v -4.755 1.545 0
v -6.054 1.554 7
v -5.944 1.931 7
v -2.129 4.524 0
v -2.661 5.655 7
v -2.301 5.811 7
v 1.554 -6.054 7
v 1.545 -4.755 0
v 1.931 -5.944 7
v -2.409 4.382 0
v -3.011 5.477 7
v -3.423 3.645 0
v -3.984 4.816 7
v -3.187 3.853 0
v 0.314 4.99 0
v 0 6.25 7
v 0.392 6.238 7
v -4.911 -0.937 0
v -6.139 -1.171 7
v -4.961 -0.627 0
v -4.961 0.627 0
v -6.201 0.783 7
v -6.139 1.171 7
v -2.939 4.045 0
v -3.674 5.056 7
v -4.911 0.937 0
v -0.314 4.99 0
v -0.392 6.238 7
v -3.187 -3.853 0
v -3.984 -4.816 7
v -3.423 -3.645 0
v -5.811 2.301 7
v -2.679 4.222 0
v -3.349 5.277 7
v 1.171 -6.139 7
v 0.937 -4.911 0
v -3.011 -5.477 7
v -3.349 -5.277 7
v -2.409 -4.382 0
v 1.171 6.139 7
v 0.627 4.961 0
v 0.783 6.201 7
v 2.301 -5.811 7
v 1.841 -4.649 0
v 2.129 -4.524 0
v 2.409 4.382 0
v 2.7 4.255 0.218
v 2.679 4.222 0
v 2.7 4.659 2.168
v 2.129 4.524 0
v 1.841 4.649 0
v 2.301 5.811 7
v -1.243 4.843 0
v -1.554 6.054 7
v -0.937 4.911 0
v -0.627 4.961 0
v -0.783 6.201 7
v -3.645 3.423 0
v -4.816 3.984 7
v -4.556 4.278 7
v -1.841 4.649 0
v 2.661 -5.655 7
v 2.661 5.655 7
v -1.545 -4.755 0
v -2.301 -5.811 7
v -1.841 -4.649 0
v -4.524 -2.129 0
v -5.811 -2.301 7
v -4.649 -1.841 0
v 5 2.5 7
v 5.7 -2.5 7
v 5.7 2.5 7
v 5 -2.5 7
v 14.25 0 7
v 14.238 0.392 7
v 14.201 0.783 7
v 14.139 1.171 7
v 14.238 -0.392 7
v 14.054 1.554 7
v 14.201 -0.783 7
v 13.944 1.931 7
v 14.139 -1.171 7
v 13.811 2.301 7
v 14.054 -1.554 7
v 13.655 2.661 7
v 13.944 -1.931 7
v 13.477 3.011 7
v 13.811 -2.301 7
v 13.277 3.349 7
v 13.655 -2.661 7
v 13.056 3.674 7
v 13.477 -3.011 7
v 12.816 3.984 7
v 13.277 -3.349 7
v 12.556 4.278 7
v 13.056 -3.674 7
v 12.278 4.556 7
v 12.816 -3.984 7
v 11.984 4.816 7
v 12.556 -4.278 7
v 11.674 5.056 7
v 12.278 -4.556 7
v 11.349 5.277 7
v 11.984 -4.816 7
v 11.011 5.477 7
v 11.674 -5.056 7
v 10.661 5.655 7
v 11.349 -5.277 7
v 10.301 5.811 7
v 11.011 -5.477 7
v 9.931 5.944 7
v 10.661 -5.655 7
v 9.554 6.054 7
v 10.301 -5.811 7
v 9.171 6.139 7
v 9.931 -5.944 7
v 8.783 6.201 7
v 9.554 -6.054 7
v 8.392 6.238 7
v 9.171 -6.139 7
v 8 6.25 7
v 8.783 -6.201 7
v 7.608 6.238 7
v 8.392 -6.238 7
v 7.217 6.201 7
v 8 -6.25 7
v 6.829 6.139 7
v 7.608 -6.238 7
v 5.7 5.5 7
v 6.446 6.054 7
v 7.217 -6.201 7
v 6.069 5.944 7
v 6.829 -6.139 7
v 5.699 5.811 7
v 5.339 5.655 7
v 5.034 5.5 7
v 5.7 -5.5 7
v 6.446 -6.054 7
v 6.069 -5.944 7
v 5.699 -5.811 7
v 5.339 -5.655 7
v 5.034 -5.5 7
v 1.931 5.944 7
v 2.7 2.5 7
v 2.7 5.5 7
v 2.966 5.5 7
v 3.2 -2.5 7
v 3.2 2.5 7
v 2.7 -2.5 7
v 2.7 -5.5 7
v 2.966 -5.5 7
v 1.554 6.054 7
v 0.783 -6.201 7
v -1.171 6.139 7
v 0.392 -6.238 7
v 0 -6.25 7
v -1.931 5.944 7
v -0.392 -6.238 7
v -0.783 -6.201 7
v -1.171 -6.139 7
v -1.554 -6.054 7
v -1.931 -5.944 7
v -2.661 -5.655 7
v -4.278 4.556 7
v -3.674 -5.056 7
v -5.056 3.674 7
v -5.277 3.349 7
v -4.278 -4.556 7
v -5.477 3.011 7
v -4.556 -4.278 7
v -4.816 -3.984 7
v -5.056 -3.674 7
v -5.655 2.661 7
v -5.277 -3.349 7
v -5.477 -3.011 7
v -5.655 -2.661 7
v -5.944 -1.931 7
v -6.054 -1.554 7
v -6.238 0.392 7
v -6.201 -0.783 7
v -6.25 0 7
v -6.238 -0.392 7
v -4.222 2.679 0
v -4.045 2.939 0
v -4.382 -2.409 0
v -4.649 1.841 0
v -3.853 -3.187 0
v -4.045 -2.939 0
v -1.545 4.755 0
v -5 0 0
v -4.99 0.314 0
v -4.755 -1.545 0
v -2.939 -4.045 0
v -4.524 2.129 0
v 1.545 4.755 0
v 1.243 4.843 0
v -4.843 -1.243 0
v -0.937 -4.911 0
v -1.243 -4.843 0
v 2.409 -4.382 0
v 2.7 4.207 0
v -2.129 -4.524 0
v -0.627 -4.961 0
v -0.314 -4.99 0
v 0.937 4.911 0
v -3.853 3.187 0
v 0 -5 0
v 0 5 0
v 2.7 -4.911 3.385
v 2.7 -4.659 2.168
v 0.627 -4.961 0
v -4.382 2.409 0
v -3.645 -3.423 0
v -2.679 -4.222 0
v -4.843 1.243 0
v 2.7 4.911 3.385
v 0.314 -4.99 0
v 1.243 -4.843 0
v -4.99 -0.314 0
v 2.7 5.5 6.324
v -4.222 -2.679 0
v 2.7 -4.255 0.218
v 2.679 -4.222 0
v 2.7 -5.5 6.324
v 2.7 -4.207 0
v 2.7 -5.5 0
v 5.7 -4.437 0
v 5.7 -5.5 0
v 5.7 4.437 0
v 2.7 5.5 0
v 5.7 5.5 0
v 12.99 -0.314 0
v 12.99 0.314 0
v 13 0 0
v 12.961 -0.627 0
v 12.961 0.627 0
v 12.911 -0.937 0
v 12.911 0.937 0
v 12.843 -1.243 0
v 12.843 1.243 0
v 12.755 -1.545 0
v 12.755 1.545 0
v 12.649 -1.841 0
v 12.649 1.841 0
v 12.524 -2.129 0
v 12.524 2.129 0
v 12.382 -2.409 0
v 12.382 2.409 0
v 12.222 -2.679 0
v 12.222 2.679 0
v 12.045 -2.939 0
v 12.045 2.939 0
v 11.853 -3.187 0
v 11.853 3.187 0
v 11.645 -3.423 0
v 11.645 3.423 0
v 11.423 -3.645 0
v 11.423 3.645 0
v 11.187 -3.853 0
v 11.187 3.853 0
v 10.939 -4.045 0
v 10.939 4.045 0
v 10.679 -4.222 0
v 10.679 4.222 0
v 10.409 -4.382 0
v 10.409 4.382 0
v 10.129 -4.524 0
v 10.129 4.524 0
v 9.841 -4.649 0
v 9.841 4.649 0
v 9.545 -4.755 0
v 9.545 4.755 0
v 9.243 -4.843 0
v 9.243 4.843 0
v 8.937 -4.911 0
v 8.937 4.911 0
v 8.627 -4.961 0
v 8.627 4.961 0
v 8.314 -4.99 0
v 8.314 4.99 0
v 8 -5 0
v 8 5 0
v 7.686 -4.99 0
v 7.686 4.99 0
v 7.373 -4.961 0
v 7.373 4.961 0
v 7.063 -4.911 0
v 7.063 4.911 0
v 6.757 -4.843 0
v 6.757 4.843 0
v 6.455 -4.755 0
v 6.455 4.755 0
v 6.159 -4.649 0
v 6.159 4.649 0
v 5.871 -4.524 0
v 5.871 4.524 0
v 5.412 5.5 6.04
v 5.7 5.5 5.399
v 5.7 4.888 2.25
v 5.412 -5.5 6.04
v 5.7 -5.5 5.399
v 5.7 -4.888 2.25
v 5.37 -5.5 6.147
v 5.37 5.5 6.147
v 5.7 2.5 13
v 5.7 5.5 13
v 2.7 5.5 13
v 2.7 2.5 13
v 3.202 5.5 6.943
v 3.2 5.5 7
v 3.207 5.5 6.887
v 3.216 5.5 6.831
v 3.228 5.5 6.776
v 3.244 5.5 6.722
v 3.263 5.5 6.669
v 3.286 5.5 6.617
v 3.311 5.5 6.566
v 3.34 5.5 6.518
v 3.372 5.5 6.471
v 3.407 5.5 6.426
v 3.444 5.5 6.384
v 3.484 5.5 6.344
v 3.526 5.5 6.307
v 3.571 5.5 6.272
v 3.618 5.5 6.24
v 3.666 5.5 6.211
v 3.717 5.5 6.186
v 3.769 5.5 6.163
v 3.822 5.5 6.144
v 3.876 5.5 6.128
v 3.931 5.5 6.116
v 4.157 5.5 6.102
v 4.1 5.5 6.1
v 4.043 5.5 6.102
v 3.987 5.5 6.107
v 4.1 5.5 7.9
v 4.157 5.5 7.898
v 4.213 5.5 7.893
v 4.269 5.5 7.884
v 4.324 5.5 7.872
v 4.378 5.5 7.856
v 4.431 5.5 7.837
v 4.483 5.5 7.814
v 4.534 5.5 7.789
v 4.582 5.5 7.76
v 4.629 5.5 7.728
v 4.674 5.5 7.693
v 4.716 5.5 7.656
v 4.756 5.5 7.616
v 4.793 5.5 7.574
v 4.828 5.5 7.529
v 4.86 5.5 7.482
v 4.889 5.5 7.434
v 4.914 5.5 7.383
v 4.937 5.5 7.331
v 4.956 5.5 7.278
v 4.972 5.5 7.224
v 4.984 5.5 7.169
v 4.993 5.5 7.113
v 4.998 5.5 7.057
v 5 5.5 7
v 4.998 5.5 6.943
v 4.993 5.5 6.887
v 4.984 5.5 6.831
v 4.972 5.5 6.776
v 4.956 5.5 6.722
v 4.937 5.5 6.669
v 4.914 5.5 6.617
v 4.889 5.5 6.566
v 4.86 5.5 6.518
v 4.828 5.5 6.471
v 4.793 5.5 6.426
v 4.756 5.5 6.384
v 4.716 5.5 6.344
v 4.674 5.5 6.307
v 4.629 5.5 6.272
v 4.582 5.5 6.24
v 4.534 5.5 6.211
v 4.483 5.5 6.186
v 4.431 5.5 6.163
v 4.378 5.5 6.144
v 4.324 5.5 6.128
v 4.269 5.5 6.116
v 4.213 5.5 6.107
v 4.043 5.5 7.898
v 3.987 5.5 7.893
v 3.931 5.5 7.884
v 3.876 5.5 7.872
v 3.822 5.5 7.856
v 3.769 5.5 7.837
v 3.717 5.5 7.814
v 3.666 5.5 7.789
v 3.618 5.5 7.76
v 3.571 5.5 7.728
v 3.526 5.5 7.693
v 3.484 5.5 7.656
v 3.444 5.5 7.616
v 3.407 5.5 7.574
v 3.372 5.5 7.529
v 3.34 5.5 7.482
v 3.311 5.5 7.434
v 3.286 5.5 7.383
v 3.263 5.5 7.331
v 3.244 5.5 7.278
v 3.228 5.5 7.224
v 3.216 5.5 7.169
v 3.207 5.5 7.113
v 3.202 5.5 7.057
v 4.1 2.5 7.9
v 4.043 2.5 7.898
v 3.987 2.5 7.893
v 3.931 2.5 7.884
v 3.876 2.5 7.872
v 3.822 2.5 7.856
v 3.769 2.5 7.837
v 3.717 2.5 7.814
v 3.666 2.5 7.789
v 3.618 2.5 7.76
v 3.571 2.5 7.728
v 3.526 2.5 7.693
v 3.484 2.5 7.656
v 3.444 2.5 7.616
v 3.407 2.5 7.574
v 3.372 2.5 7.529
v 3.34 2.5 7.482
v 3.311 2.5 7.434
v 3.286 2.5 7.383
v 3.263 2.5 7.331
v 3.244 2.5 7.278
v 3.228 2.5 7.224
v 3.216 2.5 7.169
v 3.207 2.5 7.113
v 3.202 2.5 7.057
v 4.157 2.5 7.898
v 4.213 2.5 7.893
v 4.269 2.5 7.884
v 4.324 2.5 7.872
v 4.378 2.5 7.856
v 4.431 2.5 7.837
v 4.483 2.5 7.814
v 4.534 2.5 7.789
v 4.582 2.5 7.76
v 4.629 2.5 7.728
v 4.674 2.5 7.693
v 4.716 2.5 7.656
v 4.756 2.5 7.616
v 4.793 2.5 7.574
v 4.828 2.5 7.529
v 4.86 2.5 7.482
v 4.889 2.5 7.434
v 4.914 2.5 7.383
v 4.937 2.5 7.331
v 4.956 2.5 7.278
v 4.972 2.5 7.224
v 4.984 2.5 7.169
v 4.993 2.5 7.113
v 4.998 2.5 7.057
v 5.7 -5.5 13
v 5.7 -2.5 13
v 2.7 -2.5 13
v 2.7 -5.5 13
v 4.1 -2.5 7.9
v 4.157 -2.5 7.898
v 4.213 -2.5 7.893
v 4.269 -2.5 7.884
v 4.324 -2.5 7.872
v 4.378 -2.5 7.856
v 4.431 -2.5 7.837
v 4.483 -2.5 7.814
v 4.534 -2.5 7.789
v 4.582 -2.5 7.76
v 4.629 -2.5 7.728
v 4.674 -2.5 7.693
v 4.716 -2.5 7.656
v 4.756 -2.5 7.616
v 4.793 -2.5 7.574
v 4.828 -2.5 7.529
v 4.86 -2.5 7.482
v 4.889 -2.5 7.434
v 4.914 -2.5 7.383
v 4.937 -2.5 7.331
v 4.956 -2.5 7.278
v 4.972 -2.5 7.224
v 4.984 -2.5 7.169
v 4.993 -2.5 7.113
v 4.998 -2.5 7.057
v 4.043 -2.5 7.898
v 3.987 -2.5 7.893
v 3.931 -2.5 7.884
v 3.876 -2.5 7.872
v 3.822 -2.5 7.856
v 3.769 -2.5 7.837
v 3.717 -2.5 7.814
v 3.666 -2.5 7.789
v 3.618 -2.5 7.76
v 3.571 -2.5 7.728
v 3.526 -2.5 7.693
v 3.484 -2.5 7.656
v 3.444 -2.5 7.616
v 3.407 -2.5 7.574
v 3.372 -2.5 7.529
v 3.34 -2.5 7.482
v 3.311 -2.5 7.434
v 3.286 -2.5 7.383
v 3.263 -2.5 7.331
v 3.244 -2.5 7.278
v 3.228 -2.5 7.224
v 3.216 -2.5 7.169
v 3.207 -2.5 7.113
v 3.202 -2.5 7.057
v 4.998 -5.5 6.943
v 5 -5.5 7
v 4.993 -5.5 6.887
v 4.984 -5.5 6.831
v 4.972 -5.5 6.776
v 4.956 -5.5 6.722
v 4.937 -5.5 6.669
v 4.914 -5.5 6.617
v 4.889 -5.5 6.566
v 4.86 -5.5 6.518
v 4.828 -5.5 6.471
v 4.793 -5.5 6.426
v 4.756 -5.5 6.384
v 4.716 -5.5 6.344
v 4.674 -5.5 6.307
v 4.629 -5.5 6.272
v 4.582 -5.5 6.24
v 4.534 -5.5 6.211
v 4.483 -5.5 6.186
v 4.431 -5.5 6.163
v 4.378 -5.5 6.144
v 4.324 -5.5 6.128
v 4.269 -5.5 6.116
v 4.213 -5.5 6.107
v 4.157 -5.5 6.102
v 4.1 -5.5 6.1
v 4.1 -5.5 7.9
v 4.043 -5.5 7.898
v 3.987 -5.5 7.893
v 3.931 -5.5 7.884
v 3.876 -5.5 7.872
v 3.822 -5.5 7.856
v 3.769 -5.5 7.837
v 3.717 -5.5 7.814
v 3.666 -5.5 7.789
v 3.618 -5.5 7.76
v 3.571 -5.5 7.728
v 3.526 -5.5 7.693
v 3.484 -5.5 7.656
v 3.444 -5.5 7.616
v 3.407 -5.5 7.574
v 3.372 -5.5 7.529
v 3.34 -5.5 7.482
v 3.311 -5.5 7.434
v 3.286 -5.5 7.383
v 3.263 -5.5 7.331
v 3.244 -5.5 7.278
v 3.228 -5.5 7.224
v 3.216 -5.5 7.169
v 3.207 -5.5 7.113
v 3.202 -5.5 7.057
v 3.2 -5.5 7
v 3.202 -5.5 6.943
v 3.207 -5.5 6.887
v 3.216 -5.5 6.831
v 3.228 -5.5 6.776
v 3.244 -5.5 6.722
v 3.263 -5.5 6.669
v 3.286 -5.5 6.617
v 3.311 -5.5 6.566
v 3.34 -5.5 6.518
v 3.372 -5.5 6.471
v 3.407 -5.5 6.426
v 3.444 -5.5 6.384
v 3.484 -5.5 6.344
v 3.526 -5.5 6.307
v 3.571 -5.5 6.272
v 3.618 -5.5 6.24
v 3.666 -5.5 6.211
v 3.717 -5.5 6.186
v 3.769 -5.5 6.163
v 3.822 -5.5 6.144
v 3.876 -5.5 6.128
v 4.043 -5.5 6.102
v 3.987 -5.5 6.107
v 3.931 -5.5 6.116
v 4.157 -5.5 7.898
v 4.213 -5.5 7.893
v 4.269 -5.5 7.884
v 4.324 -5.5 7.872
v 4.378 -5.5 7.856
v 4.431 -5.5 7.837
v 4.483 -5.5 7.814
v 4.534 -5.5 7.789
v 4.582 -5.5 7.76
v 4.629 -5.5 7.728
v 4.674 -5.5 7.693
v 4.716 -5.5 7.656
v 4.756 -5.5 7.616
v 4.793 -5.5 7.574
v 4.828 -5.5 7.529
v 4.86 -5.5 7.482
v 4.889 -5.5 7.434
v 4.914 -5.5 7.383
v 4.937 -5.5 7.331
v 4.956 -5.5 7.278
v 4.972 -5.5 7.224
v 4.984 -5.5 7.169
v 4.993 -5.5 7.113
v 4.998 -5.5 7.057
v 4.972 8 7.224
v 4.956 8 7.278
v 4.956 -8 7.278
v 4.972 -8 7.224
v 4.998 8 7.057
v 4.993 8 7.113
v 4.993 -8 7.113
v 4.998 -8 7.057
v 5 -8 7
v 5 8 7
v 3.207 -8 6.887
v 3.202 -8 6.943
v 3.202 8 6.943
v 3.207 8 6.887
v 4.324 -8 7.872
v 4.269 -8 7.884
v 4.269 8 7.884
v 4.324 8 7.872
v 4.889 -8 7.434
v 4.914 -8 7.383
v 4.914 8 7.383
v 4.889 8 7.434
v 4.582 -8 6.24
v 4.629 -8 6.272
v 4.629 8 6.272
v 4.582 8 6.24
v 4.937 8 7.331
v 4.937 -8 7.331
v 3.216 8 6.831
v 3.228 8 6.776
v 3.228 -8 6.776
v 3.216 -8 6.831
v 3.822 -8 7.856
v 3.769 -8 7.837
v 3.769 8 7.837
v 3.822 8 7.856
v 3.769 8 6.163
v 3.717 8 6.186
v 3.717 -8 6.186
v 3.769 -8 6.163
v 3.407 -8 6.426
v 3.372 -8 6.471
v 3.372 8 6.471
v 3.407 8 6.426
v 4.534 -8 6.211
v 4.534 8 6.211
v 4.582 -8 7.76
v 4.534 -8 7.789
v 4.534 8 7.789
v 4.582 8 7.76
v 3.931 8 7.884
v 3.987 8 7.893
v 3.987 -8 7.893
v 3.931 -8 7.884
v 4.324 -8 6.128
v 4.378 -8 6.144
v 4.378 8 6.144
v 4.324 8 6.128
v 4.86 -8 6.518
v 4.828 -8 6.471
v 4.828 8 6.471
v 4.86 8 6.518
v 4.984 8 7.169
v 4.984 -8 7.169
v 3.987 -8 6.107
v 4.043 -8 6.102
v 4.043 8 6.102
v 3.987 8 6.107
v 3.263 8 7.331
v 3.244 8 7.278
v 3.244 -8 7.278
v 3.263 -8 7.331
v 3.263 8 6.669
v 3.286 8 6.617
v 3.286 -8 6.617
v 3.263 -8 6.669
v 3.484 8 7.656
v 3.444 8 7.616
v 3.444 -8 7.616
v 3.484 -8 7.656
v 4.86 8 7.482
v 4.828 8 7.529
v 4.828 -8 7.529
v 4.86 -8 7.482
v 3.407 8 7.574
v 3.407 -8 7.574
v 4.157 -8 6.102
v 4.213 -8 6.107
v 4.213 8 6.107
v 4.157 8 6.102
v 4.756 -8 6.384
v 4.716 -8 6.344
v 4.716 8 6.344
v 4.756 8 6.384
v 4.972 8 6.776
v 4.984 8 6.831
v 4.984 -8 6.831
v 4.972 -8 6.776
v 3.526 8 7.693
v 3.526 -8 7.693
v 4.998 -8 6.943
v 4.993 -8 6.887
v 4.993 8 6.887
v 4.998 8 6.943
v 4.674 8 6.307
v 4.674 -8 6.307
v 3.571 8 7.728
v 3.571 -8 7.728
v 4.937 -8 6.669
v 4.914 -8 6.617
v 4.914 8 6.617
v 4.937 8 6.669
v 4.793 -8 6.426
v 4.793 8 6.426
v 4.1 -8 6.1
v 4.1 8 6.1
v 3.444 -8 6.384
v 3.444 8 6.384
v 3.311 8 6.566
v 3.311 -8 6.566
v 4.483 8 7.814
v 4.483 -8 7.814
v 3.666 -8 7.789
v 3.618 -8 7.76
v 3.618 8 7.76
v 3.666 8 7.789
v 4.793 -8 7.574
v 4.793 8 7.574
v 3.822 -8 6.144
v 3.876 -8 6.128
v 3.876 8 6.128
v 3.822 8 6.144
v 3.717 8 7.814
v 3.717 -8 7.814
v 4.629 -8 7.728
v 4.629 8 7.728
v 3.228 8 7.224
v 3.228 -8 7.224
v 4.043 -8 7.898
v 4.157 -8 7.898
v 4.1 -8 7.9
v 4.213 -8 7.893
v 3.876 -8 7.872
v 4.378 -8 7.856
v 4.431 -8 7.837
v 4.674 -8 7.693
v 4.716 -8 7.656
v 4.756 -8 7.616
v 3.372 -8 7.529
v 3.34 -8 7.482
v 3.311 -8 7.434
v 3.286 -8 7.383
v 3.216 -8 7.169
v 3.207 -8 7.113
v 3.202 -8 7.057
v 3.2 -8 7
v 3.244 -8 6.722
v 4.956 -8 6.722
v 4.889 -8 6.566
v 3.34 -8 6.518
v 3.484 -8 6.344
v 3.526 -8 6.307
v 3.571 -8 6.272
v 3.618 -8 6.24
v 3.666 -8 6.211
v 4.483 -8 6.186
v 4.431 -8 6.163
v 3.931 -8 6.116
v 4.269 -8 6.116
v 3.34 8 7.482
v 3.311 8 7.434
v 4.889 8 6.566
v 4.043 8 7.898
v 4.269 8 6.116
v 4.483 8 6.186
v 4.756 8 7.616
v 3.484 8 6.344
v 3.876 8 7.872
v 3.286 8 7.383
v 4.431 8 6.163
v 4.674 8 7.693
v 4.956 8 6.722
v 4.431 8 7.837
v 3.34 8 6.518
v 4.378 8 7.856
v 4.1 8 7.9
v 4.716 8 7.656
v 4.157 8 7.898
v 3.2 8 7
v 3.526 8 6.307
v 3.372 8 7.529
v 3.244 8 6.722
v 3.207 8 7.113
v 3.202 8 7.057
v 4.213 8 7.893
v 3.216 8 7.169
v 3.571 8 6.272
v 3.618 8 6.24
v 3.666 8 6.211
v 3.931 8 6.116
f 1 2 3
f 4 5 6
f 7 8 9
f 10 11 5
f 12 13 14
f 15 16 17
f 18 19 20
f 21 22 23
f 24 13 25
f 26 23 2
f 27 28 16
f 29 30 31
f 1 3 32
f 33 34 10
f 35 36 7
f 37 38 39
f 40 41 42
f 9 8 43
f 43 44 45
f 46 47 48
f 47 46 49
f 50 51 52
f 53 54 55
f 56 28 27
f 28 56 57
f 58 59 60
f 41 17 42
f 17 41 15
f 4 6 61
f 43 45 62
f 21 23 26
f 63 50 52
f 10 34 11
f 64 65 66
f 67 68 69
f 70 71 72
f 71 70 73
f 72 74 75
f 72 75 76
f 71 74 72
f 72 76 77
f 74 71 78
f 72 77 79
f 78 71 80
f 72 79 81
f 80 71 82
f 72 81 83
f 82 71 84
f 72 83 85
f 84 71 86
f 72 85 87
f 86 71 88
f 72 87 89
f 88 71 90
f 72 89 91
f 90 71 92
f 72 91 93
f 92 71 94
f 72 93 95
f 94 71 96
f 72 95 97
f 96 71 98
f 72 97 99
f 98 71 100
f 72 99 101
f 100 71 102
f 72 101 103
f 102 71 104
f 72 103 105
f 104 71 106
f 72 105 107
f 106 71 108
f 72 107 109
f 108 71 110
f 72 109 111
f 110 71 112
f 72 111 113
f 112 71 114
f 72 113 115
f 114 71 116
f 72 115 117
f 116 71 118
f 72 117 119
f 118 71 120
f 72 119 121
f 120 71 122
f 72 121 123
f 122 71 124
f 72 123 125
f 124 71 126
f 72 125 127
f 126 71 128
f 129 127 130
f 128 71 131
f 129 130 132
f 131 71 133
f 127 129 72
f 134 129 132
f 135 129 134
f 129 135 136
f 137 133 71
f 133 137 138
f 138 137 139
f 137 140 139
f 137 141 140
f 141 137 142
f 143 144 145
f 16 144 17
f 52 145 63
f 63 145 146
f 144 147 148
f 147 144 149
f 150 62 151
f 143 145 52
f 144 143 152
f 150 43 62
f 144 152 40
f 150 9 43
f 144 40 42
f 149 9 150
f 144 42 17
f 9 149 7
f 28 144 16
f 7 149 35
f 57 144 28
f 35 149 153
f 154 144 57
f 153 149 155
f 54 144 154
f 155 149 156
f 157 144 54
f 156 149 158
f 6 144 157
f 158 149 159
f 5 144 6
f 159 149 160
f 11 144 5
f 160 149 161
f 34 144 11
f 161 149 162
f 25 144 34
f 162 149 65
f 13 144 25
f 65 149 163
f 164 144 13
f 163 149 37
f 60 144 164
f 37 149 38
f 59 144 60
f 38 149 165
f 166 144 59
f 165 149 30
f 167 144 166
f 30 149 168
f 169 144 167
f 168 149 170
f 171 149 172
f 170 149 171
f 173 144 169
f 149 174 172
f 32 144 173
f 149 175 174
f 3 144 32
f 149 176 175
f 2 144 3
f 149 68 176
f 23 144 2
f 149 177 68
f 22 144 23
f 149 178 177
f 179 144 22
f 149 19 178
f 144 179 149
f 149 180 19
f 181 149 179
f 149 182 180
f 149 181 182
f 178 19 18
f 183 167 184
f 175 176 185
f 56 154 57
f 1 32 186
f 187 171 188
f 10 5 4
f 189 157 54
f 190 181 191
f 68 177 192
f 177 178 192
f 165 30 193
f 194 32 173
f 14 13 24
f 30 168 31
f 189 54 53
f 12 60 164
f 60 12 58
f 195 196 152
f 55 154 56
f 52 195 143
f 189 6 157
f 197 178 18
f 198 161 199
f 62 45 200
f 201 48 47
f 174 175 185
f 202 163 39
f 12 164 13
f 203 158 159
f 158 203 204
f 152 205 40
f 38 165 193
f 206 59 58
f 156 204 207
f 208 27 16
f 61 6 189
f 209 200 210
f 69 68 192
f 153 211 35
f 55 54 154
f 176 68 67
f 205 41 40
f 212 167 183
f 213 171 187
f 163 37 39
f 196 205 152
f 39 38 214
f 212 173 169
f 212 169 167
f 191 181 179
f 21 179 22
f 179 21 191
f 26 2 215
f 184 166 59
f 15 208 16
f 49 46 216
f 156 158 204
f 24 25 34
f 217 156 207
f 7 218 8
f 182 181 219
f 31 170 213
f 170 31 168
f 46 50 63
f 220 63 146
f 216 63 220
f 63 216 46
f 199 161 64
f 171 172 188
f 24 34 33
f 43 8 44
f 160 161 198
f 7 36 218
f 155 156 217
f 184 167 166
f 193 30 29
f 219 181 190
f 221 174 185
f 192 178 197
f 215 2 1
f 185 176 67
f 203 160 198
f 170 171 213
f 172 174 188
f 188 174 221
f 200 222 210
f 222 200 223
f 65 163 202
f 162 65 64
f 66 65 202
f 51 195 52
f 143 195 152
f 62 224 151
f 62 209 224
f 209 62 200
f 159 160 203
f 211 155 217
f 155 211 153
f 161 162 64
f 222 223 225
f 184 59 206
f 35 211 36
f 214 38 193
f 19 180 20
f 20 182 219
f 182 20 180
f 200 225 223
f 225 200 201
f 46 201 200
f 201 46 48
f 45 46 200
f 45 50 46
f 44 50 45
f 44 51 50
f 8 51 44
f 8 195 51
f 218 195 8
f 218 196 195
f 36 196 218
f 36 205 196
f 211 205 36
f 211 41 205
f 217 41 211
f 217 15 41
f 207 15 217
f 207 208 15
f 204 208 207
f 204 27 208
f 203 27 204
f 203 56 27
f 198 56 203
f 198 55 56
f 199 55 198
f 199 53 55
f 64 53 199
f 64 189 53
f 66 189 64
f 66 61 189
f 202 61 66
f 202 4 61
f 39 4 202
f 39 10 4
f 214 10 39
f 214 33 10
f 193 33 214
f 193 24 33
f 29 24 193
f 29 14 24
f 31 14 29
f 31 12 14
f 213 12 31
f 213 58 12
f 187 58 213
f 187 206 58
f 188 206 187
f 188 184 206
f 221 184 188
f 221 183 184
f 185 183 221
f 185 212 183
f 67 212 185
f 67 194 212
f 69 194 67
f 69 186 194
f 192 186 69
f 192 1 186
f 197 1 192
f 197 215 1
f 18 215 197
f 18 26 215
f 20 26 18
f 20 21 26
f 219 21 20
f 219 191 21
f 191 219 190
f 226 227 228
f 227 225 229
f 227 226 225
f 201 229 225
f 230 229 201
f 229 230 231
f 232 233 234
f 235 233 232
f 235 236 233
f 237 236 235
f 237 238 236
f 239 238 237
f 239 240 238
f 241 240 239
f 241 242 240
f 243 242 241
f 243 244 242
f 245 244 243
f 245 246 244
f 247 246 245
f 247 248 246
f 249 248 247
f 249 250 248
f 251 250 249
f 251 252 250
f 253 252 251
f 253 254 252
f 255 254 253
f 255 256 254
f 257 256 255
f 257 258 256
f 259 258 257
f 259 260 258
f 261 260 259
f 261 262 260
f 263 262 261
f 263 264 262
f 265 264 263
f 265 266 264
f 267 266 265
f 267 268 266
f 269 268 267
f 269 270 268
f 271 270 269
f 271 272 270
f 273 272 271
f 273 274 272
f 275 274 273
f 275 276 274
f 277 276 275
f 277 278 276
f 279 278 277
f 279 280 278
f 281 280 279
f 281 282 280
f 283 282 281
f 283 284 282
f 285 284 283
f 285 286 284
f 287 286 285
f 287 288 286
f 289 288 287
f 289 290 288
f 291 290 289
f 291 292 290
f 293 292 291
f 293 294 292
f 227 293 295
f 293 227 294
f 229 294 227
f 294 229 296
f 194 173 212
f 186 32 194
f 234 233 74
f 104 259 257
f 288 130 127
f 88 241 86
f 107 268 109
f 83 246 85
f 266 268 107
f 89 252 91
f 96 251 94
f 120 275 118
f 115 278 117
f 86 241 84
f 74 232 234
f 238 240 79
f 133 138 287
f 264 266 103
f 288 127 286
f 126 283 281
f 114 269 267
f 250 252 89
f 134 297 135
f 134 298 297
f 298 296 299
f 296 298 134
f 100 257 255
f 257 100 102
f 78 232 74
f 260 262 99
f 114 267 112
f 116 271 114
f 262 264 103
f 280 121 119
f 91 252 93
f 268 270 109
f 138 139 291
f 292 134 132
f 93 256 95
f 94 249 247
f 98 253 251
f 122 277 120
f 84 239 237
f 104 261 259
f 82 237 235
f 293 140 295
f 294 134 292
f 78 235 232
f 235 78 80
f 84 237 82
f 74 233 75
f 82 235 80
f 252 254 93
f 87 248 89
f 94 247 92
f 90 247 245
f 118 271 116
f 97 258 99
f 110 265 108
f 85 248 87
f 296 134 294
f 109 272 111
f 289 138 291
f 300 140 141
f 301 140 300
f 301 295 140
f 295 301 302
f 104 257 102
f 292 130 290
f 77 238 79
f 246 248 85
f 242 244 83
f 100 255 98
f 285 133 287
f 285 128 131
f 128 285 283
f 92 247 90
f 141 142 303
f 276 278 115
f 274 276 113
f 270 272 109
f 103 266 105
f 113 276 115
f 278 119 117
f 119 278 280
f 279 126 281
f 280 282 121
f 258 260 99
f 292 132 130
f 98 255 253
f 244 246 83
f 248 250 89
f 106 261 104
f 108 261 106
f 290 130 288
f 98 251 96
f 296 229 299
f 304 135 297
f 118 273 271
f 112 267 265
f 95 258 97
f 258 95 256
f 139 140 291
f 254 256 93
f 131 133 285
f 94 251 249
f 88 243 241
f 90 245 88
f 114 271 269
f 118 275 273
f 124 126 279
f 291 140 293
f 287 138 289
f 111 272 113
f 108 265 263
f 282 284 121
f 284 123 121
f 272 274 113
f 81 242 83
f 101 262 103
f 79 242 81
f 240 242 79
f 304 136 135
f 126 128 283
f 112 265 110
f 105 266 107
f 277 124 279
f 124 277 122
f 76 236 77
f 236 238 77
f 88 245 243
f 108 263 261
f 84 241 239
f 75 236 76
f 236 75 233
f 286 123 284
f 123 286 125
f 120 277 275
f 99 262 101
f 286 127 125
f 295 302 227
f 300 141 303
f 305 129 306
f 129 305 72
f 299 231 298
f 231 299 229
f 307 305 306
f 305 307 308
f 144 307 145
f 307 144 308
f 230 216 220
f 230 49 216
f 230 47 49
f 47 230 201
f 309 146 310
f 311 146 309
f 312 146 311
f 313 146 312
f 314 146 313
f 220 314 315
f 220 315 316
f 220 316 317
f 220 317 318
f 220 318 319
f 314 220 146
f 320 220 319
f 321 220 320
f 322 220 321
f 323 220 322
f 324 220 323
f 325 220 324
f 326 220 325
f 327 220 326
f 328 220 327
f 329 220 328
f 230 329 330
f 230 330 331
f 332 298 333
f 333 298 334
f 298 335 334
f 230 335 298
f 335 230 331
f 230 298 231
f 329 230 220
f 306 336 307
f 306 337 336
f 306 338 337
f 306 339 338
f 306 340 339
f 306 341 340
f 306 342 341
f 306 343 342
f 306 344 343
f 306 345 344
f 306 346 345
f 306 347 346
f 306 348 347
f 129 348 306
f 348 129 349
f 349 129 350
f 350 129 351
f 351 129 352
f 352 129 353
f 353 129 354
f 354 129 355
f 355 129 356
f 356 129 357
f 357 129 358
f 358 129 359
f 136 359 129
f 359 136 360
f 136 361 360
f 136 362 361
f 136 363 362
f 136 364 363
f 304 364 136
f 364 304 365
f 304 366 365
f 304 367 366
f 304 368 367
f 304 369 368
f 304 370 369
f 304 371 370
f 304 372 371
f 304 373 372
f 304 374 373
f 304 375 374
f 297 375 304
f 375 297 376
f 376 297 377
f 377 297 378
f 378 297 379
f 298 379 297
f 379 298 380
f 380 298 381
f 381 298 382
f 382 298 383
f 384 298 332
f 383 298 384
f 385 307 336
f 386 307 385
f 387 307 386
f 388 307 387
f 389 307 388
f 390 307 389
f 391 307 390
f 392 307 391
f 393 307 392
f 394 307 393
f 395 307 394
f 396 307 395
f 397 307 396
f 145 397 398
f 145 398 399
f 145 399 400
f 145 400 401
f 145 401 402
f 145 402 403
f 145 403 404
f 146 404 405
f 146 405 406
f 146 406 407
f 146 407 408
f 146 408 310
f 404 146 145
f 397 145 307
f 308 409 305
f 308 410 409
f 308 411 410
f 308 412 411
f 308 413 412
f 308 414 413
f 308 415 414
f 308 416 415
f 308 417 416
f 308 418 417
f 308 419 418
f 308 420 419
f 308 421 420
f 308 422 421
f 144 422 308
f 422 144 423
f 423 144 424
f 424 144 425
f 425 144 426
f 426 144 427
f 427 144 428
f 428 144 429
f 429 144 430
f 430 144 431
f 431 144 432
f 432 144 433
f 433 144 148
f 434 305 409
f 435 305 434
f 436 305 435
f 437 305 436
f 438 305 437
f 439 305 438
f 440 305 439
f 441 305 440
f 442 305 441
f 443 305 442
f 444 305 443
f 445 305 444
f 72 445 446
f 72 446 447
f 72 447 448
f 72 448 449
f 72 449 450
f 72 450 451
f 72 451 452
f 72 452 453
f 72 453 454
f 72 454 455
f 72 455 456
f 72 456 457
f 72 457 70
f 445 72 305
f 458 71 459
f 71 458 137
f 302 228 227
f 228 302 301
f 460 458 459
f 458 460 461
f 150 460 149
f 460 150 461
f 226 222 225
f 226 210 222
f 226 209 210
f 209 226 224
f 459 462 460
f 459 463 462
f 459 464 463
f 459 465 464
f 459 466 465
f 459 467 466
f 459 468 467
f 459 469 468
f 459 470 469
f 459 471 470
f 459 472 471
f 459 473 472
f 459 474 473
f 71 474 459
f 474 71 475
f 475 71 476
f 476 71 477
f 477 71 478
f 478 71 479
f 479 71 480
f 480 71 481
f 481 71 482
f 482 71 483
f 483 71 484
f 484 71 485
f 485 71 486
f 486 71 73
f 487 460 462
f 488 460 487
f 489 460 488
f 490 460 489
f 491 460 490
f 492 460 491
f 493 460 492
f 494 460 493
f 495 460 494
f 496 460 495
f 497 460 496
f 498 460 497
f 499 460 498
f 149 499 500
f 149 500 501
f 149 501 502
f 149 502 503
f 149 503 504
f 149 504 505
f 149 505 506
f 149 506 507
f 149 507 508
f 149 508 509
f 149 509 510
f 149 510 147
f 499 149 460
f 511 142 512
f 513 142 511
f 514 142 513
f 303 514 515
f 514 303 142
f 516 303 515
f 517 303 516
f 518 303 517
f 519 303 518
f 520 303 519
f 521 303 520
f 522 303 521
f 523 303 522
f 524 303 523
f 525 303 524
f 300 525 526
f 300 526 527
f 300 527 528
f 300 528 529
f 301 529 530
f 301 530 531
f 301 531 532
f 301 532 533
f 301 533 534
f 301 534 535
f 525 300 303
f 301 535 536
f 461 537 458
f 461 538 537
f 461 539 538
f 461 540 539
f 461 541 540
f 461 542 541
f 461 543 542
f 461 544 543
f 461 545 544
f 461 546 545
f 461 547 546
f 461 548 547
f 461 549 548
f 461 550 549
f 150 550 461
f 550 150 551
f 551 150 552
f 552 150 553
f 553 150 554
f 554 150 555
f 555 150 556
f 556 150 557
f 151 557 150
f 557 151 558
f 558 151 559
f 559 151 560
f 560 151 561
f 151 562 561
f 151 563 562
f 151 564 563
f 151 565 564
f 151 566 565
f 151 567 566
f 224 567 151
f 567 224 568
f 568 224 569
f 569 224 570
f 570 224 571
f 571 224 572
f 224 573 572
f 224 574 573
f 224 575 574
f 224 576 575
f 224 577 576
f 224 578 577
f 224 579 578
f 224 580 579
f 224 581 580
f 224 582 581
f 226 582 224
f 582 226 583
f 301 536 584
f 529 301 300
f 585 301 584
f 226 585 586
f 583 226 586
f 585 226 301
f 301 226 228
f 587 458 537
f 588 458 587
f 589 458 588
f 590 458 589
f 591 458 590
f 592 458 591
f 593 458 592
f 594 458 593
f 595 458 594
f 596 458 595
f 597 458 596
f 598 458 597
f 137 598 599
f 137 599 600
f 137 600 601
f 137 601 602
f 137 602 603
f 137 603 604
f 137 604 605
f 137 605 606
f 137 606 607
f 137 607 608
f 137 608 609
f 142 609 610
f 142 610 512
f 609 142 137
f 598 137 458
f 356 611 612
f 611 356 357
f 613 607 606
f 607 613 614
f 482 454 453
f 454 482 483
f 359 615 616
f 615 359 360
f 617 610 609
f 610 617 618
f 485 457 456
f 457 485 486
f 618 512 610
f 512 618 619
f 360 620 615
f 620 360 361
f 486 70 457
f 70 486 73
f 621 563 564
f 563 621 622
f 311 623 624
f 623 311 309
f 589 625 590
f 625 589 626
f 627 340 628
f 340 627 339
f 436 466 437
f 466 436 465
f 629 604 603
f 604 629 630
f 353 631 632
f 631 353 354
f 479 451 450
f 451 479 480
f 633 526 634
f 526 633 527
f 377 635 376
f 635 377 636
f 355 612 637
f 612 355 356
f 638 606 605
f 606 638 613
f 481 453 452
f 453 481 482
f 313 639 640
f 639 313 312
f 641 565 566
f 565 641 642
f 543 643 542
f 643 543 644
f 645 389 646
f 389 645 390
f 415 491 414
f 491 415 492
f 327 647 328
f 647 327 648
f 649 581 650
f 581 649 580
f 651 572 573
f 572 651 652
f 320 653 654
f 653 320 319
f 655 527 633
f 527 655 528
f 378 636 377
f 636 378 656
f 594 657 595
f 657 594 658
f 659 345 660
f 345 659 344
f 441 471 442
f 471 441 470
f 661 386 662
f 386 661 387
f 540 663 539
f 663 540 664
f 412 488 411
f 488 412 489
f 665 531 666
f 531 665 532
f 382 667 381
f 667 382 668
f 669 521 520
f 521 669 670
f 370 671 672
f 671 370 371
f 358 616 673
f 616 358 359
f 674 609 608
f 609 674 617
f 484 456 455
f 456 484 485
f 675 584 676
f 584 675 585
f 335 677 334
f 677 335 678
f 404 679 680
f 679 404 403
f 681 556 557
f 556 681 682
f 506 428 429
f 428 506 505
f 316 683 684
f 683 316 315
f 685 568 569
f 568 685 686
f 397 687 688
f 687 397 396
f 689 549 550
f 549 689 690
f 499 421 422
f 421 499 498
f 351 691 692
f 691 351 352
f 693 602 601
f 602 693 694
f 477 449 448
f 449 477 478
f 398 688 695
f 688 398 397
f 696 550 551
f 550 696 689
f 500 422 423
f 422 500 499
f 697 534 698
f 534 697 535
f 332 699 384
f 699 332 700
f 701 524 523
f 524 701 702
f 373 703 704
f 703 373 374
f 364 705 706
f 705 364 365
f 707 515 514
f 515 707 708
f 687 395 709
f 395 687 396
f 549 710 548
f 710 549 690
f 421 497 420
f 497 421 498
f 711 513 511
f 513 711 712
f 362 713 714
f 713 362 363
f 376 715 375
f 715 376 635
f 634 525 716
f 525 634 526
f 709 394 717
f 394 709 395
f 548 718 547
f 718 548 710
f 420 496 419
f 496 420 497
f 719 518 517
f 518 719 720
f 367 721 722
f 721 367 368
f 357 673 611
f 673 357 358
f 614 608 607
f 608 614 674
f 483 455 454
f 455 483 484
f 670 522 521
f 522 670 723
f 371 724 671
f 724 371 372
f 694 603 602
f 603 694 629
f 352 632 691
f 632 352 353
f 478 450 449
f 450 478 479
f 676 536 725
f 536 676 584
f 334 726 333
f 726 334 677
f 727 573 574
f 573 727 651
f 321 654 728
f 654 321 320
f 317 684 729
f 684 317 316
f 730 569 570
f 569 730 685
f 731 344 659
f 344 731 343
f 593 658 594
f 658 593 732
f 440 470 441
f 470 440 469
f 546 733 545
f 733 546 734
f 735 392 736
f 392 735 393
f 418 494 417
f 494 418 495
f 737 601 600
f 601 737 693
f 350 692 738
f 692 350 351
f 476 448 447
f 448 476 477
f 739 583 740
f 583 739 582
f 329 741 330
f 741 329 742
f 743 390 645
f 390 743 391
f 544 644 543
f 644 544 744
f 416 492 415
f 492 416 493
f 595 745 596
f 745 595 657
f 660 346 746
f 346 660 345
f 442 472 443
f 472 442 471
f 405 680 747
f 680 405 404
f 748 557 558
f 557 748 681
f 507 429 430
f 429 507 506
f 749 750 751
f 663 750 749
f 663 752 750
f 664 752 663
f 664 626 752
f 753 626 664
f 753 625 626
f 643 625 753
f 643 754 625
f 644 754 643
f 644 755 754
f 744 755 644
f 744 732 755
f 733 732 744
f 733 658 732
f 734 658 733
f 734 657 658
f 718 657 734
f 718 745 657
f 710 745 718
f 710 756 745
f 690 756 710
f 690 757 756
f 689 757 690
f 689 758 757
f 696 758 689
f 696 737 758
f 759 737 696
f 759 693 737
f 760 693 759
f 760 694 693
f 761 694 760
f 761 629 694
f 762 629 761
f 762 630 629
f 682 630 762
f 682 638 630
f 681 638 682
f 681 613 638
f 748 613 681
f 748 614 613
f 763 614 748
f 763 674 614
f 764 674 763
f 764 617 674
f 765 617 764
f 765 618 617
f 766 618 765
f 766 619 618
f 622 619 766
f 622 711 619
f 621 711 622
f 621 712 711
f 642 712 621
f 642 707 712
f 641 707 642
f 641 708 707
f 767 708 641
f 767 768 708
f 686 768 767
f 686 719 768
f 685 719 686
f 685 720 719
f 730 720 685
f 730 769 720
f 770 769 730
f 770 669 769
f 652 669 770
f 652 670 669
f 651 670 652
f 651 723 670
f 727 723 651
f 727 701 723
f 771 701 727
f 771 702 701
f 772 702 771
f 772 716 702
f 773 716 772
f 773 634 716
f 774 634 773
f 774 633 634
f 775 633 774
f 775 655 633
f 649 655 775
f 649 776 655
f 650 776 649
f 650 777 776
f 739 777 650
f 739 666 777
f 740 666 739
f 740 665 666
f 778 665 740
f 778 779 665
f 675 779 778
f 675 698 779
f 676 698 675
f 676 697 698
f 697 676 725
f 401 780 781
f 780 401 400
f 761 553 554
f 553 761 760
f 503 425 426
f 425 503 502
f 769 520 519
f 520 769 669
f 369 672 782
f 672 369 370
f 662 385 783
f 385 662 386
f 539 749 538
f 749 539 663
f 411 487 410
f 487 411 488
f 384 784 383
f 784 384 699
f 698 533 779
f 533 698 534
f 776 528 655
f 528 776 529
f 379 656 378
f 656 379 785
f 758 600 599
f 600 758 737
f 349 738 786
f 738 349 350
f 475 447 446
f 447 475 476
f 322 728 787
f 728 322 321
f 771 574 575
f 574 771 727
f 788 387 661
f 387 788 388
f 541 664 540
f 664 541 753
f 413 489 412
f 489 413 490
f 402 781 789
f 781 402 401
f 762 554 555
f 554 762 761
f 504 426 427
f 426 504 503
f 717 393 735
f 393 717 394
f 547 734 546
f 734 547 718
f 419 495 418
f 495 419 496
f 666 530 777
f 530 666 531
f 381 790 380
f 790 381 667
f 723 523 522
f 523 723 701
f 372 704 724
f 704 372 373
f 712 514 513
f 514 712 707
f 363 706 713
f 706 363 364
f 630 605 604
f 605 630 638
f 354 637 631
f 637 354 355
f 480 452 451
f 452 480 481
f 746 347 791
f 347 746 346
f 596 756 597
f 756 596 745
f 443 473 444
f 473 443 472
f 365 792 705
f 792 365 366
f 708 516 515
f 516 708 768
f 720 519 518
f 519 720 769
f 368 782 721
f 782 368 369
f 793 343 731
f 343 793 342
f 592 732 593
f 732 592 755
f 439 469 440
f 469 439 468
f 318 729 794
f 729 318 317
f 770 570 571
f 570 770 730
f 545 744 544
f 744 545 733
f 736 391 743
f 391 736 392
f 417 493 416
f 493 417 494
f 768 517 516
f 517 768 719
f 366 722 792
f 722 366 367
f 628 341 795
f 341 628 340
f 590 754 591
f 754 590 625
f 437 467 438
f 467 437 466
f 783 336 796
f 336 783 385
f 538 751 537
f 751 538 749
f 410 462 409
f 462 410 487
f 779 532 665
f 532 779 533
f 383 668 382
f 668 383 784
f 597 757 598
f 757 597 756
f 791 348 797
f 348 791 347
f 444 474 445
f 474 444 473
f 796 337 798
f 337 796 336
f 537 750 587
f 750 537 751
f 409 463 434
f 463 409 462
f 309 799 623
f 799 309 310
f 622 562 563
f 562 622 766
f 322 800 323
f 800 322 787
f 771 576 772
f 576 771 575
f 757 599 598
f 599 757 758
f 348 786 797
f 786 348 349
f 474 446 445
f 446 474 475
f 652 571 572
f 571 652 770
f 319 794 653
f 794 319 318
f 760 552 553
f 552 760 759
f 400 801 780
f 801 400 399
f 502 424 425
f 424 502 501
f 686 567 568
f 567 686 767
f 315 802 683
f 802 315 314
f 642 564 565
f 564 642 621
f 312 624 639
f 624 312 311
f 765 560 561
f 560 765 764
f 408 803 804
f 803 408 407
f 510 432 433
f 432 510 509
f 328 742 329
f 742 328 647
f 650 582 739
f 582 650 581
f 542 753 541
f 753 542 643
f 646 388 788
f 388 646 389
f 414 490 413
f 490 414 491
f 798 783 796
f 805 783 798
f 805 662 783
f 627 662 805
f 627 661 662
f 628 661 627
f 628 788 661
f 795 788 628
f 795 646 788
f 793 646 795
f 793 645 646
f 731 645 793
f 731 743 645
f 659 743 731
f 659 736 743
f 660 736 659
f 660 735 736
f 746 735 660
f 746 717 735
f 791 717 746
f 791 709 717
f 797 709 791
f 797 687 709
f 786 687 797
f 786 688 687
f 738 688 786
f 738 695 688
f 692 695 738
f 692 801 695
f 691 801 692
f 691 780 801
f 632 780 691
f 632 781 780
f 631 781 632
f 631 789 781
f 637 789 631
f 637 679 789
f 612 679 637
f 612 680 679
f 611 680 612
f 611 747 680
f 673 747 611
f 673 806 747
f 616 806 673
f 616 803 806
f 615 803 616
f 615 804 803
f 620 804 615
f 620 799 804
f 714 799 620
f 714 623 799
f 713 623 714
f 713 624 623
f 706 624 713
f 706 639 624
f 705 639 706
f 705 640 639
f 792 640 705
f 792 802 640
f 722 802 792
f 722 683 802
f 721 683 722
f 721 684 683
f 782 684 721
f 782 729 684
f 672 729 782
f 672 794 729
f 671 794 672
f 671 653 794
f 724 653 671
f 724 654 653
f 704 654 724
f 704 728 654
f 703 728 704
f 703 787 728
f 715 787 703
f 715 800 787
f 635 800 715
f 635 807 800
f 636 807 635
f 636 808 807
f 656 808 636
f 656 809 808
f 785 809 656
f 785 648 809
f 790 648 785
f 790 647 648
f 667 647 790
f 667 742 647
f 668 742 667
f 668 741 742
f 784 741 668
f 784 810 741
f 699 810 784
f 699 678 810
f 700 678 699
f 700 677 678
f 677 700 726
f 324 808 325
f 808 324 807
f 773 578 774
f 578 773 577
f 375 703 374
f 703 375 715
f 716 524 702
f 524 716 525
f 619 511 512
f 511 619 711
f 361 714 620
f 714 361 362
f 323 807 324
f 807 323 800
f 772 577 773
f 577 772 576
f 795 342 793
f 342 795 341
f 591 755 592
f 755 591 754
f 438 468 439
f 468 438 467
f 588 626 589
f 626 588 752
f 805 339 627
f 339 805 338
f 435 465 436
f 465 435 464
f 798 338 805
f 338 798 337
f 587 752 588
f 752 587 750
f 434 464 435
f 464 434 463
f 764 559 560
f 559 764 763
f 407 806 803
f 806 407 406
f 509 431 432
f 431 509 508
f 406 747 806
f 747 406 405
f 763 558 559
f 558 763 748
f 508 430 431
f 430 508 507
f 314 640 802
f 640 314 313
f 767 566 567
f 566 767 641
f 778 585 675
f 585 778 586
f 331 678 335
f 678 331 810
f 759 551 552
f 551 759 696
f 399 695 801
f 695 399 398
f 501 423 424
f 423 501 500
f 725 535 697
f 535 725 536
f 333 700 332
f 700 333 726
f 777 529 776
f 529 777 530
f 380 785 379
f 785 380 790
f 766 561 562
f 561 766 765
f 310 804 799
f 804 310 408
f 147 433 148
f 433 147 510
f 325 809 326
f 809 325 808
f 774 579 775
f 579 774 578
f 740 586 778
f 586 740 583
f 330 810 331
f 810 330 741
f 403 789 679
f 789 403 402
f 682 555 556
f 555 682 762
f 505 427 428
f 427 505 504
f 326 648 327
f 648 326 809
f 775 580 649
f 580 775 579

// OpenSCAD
$fn = 100;

lower = 12.5;
upper = 10;
switch_height = 7;
distance = 8;

legs_height = 6;
legs_width = 3;
legs_depth = 3;

axis_diameter = 1.8;
axis_length = 16;

cylinder(d1=upper, d2=lower, switch_height);

translate([distance, 0, 0]) cylinder(d1=upper, d2=lower, switch_height);

translate([2.7, -legs_depth / 2 + 4, 0]) cube([legs_width, legs_depth, switch_height + legs_height]);
translate([2.7, -legs_depth / 2 - 4, 0]) cube([legs_width, legs_depth, switch_height + legs_height]);

translate([4.1, axis_length/2, switch_height]) rotate([90, 0, 0]) cylinder(d=axis_diameter, axis_length);
